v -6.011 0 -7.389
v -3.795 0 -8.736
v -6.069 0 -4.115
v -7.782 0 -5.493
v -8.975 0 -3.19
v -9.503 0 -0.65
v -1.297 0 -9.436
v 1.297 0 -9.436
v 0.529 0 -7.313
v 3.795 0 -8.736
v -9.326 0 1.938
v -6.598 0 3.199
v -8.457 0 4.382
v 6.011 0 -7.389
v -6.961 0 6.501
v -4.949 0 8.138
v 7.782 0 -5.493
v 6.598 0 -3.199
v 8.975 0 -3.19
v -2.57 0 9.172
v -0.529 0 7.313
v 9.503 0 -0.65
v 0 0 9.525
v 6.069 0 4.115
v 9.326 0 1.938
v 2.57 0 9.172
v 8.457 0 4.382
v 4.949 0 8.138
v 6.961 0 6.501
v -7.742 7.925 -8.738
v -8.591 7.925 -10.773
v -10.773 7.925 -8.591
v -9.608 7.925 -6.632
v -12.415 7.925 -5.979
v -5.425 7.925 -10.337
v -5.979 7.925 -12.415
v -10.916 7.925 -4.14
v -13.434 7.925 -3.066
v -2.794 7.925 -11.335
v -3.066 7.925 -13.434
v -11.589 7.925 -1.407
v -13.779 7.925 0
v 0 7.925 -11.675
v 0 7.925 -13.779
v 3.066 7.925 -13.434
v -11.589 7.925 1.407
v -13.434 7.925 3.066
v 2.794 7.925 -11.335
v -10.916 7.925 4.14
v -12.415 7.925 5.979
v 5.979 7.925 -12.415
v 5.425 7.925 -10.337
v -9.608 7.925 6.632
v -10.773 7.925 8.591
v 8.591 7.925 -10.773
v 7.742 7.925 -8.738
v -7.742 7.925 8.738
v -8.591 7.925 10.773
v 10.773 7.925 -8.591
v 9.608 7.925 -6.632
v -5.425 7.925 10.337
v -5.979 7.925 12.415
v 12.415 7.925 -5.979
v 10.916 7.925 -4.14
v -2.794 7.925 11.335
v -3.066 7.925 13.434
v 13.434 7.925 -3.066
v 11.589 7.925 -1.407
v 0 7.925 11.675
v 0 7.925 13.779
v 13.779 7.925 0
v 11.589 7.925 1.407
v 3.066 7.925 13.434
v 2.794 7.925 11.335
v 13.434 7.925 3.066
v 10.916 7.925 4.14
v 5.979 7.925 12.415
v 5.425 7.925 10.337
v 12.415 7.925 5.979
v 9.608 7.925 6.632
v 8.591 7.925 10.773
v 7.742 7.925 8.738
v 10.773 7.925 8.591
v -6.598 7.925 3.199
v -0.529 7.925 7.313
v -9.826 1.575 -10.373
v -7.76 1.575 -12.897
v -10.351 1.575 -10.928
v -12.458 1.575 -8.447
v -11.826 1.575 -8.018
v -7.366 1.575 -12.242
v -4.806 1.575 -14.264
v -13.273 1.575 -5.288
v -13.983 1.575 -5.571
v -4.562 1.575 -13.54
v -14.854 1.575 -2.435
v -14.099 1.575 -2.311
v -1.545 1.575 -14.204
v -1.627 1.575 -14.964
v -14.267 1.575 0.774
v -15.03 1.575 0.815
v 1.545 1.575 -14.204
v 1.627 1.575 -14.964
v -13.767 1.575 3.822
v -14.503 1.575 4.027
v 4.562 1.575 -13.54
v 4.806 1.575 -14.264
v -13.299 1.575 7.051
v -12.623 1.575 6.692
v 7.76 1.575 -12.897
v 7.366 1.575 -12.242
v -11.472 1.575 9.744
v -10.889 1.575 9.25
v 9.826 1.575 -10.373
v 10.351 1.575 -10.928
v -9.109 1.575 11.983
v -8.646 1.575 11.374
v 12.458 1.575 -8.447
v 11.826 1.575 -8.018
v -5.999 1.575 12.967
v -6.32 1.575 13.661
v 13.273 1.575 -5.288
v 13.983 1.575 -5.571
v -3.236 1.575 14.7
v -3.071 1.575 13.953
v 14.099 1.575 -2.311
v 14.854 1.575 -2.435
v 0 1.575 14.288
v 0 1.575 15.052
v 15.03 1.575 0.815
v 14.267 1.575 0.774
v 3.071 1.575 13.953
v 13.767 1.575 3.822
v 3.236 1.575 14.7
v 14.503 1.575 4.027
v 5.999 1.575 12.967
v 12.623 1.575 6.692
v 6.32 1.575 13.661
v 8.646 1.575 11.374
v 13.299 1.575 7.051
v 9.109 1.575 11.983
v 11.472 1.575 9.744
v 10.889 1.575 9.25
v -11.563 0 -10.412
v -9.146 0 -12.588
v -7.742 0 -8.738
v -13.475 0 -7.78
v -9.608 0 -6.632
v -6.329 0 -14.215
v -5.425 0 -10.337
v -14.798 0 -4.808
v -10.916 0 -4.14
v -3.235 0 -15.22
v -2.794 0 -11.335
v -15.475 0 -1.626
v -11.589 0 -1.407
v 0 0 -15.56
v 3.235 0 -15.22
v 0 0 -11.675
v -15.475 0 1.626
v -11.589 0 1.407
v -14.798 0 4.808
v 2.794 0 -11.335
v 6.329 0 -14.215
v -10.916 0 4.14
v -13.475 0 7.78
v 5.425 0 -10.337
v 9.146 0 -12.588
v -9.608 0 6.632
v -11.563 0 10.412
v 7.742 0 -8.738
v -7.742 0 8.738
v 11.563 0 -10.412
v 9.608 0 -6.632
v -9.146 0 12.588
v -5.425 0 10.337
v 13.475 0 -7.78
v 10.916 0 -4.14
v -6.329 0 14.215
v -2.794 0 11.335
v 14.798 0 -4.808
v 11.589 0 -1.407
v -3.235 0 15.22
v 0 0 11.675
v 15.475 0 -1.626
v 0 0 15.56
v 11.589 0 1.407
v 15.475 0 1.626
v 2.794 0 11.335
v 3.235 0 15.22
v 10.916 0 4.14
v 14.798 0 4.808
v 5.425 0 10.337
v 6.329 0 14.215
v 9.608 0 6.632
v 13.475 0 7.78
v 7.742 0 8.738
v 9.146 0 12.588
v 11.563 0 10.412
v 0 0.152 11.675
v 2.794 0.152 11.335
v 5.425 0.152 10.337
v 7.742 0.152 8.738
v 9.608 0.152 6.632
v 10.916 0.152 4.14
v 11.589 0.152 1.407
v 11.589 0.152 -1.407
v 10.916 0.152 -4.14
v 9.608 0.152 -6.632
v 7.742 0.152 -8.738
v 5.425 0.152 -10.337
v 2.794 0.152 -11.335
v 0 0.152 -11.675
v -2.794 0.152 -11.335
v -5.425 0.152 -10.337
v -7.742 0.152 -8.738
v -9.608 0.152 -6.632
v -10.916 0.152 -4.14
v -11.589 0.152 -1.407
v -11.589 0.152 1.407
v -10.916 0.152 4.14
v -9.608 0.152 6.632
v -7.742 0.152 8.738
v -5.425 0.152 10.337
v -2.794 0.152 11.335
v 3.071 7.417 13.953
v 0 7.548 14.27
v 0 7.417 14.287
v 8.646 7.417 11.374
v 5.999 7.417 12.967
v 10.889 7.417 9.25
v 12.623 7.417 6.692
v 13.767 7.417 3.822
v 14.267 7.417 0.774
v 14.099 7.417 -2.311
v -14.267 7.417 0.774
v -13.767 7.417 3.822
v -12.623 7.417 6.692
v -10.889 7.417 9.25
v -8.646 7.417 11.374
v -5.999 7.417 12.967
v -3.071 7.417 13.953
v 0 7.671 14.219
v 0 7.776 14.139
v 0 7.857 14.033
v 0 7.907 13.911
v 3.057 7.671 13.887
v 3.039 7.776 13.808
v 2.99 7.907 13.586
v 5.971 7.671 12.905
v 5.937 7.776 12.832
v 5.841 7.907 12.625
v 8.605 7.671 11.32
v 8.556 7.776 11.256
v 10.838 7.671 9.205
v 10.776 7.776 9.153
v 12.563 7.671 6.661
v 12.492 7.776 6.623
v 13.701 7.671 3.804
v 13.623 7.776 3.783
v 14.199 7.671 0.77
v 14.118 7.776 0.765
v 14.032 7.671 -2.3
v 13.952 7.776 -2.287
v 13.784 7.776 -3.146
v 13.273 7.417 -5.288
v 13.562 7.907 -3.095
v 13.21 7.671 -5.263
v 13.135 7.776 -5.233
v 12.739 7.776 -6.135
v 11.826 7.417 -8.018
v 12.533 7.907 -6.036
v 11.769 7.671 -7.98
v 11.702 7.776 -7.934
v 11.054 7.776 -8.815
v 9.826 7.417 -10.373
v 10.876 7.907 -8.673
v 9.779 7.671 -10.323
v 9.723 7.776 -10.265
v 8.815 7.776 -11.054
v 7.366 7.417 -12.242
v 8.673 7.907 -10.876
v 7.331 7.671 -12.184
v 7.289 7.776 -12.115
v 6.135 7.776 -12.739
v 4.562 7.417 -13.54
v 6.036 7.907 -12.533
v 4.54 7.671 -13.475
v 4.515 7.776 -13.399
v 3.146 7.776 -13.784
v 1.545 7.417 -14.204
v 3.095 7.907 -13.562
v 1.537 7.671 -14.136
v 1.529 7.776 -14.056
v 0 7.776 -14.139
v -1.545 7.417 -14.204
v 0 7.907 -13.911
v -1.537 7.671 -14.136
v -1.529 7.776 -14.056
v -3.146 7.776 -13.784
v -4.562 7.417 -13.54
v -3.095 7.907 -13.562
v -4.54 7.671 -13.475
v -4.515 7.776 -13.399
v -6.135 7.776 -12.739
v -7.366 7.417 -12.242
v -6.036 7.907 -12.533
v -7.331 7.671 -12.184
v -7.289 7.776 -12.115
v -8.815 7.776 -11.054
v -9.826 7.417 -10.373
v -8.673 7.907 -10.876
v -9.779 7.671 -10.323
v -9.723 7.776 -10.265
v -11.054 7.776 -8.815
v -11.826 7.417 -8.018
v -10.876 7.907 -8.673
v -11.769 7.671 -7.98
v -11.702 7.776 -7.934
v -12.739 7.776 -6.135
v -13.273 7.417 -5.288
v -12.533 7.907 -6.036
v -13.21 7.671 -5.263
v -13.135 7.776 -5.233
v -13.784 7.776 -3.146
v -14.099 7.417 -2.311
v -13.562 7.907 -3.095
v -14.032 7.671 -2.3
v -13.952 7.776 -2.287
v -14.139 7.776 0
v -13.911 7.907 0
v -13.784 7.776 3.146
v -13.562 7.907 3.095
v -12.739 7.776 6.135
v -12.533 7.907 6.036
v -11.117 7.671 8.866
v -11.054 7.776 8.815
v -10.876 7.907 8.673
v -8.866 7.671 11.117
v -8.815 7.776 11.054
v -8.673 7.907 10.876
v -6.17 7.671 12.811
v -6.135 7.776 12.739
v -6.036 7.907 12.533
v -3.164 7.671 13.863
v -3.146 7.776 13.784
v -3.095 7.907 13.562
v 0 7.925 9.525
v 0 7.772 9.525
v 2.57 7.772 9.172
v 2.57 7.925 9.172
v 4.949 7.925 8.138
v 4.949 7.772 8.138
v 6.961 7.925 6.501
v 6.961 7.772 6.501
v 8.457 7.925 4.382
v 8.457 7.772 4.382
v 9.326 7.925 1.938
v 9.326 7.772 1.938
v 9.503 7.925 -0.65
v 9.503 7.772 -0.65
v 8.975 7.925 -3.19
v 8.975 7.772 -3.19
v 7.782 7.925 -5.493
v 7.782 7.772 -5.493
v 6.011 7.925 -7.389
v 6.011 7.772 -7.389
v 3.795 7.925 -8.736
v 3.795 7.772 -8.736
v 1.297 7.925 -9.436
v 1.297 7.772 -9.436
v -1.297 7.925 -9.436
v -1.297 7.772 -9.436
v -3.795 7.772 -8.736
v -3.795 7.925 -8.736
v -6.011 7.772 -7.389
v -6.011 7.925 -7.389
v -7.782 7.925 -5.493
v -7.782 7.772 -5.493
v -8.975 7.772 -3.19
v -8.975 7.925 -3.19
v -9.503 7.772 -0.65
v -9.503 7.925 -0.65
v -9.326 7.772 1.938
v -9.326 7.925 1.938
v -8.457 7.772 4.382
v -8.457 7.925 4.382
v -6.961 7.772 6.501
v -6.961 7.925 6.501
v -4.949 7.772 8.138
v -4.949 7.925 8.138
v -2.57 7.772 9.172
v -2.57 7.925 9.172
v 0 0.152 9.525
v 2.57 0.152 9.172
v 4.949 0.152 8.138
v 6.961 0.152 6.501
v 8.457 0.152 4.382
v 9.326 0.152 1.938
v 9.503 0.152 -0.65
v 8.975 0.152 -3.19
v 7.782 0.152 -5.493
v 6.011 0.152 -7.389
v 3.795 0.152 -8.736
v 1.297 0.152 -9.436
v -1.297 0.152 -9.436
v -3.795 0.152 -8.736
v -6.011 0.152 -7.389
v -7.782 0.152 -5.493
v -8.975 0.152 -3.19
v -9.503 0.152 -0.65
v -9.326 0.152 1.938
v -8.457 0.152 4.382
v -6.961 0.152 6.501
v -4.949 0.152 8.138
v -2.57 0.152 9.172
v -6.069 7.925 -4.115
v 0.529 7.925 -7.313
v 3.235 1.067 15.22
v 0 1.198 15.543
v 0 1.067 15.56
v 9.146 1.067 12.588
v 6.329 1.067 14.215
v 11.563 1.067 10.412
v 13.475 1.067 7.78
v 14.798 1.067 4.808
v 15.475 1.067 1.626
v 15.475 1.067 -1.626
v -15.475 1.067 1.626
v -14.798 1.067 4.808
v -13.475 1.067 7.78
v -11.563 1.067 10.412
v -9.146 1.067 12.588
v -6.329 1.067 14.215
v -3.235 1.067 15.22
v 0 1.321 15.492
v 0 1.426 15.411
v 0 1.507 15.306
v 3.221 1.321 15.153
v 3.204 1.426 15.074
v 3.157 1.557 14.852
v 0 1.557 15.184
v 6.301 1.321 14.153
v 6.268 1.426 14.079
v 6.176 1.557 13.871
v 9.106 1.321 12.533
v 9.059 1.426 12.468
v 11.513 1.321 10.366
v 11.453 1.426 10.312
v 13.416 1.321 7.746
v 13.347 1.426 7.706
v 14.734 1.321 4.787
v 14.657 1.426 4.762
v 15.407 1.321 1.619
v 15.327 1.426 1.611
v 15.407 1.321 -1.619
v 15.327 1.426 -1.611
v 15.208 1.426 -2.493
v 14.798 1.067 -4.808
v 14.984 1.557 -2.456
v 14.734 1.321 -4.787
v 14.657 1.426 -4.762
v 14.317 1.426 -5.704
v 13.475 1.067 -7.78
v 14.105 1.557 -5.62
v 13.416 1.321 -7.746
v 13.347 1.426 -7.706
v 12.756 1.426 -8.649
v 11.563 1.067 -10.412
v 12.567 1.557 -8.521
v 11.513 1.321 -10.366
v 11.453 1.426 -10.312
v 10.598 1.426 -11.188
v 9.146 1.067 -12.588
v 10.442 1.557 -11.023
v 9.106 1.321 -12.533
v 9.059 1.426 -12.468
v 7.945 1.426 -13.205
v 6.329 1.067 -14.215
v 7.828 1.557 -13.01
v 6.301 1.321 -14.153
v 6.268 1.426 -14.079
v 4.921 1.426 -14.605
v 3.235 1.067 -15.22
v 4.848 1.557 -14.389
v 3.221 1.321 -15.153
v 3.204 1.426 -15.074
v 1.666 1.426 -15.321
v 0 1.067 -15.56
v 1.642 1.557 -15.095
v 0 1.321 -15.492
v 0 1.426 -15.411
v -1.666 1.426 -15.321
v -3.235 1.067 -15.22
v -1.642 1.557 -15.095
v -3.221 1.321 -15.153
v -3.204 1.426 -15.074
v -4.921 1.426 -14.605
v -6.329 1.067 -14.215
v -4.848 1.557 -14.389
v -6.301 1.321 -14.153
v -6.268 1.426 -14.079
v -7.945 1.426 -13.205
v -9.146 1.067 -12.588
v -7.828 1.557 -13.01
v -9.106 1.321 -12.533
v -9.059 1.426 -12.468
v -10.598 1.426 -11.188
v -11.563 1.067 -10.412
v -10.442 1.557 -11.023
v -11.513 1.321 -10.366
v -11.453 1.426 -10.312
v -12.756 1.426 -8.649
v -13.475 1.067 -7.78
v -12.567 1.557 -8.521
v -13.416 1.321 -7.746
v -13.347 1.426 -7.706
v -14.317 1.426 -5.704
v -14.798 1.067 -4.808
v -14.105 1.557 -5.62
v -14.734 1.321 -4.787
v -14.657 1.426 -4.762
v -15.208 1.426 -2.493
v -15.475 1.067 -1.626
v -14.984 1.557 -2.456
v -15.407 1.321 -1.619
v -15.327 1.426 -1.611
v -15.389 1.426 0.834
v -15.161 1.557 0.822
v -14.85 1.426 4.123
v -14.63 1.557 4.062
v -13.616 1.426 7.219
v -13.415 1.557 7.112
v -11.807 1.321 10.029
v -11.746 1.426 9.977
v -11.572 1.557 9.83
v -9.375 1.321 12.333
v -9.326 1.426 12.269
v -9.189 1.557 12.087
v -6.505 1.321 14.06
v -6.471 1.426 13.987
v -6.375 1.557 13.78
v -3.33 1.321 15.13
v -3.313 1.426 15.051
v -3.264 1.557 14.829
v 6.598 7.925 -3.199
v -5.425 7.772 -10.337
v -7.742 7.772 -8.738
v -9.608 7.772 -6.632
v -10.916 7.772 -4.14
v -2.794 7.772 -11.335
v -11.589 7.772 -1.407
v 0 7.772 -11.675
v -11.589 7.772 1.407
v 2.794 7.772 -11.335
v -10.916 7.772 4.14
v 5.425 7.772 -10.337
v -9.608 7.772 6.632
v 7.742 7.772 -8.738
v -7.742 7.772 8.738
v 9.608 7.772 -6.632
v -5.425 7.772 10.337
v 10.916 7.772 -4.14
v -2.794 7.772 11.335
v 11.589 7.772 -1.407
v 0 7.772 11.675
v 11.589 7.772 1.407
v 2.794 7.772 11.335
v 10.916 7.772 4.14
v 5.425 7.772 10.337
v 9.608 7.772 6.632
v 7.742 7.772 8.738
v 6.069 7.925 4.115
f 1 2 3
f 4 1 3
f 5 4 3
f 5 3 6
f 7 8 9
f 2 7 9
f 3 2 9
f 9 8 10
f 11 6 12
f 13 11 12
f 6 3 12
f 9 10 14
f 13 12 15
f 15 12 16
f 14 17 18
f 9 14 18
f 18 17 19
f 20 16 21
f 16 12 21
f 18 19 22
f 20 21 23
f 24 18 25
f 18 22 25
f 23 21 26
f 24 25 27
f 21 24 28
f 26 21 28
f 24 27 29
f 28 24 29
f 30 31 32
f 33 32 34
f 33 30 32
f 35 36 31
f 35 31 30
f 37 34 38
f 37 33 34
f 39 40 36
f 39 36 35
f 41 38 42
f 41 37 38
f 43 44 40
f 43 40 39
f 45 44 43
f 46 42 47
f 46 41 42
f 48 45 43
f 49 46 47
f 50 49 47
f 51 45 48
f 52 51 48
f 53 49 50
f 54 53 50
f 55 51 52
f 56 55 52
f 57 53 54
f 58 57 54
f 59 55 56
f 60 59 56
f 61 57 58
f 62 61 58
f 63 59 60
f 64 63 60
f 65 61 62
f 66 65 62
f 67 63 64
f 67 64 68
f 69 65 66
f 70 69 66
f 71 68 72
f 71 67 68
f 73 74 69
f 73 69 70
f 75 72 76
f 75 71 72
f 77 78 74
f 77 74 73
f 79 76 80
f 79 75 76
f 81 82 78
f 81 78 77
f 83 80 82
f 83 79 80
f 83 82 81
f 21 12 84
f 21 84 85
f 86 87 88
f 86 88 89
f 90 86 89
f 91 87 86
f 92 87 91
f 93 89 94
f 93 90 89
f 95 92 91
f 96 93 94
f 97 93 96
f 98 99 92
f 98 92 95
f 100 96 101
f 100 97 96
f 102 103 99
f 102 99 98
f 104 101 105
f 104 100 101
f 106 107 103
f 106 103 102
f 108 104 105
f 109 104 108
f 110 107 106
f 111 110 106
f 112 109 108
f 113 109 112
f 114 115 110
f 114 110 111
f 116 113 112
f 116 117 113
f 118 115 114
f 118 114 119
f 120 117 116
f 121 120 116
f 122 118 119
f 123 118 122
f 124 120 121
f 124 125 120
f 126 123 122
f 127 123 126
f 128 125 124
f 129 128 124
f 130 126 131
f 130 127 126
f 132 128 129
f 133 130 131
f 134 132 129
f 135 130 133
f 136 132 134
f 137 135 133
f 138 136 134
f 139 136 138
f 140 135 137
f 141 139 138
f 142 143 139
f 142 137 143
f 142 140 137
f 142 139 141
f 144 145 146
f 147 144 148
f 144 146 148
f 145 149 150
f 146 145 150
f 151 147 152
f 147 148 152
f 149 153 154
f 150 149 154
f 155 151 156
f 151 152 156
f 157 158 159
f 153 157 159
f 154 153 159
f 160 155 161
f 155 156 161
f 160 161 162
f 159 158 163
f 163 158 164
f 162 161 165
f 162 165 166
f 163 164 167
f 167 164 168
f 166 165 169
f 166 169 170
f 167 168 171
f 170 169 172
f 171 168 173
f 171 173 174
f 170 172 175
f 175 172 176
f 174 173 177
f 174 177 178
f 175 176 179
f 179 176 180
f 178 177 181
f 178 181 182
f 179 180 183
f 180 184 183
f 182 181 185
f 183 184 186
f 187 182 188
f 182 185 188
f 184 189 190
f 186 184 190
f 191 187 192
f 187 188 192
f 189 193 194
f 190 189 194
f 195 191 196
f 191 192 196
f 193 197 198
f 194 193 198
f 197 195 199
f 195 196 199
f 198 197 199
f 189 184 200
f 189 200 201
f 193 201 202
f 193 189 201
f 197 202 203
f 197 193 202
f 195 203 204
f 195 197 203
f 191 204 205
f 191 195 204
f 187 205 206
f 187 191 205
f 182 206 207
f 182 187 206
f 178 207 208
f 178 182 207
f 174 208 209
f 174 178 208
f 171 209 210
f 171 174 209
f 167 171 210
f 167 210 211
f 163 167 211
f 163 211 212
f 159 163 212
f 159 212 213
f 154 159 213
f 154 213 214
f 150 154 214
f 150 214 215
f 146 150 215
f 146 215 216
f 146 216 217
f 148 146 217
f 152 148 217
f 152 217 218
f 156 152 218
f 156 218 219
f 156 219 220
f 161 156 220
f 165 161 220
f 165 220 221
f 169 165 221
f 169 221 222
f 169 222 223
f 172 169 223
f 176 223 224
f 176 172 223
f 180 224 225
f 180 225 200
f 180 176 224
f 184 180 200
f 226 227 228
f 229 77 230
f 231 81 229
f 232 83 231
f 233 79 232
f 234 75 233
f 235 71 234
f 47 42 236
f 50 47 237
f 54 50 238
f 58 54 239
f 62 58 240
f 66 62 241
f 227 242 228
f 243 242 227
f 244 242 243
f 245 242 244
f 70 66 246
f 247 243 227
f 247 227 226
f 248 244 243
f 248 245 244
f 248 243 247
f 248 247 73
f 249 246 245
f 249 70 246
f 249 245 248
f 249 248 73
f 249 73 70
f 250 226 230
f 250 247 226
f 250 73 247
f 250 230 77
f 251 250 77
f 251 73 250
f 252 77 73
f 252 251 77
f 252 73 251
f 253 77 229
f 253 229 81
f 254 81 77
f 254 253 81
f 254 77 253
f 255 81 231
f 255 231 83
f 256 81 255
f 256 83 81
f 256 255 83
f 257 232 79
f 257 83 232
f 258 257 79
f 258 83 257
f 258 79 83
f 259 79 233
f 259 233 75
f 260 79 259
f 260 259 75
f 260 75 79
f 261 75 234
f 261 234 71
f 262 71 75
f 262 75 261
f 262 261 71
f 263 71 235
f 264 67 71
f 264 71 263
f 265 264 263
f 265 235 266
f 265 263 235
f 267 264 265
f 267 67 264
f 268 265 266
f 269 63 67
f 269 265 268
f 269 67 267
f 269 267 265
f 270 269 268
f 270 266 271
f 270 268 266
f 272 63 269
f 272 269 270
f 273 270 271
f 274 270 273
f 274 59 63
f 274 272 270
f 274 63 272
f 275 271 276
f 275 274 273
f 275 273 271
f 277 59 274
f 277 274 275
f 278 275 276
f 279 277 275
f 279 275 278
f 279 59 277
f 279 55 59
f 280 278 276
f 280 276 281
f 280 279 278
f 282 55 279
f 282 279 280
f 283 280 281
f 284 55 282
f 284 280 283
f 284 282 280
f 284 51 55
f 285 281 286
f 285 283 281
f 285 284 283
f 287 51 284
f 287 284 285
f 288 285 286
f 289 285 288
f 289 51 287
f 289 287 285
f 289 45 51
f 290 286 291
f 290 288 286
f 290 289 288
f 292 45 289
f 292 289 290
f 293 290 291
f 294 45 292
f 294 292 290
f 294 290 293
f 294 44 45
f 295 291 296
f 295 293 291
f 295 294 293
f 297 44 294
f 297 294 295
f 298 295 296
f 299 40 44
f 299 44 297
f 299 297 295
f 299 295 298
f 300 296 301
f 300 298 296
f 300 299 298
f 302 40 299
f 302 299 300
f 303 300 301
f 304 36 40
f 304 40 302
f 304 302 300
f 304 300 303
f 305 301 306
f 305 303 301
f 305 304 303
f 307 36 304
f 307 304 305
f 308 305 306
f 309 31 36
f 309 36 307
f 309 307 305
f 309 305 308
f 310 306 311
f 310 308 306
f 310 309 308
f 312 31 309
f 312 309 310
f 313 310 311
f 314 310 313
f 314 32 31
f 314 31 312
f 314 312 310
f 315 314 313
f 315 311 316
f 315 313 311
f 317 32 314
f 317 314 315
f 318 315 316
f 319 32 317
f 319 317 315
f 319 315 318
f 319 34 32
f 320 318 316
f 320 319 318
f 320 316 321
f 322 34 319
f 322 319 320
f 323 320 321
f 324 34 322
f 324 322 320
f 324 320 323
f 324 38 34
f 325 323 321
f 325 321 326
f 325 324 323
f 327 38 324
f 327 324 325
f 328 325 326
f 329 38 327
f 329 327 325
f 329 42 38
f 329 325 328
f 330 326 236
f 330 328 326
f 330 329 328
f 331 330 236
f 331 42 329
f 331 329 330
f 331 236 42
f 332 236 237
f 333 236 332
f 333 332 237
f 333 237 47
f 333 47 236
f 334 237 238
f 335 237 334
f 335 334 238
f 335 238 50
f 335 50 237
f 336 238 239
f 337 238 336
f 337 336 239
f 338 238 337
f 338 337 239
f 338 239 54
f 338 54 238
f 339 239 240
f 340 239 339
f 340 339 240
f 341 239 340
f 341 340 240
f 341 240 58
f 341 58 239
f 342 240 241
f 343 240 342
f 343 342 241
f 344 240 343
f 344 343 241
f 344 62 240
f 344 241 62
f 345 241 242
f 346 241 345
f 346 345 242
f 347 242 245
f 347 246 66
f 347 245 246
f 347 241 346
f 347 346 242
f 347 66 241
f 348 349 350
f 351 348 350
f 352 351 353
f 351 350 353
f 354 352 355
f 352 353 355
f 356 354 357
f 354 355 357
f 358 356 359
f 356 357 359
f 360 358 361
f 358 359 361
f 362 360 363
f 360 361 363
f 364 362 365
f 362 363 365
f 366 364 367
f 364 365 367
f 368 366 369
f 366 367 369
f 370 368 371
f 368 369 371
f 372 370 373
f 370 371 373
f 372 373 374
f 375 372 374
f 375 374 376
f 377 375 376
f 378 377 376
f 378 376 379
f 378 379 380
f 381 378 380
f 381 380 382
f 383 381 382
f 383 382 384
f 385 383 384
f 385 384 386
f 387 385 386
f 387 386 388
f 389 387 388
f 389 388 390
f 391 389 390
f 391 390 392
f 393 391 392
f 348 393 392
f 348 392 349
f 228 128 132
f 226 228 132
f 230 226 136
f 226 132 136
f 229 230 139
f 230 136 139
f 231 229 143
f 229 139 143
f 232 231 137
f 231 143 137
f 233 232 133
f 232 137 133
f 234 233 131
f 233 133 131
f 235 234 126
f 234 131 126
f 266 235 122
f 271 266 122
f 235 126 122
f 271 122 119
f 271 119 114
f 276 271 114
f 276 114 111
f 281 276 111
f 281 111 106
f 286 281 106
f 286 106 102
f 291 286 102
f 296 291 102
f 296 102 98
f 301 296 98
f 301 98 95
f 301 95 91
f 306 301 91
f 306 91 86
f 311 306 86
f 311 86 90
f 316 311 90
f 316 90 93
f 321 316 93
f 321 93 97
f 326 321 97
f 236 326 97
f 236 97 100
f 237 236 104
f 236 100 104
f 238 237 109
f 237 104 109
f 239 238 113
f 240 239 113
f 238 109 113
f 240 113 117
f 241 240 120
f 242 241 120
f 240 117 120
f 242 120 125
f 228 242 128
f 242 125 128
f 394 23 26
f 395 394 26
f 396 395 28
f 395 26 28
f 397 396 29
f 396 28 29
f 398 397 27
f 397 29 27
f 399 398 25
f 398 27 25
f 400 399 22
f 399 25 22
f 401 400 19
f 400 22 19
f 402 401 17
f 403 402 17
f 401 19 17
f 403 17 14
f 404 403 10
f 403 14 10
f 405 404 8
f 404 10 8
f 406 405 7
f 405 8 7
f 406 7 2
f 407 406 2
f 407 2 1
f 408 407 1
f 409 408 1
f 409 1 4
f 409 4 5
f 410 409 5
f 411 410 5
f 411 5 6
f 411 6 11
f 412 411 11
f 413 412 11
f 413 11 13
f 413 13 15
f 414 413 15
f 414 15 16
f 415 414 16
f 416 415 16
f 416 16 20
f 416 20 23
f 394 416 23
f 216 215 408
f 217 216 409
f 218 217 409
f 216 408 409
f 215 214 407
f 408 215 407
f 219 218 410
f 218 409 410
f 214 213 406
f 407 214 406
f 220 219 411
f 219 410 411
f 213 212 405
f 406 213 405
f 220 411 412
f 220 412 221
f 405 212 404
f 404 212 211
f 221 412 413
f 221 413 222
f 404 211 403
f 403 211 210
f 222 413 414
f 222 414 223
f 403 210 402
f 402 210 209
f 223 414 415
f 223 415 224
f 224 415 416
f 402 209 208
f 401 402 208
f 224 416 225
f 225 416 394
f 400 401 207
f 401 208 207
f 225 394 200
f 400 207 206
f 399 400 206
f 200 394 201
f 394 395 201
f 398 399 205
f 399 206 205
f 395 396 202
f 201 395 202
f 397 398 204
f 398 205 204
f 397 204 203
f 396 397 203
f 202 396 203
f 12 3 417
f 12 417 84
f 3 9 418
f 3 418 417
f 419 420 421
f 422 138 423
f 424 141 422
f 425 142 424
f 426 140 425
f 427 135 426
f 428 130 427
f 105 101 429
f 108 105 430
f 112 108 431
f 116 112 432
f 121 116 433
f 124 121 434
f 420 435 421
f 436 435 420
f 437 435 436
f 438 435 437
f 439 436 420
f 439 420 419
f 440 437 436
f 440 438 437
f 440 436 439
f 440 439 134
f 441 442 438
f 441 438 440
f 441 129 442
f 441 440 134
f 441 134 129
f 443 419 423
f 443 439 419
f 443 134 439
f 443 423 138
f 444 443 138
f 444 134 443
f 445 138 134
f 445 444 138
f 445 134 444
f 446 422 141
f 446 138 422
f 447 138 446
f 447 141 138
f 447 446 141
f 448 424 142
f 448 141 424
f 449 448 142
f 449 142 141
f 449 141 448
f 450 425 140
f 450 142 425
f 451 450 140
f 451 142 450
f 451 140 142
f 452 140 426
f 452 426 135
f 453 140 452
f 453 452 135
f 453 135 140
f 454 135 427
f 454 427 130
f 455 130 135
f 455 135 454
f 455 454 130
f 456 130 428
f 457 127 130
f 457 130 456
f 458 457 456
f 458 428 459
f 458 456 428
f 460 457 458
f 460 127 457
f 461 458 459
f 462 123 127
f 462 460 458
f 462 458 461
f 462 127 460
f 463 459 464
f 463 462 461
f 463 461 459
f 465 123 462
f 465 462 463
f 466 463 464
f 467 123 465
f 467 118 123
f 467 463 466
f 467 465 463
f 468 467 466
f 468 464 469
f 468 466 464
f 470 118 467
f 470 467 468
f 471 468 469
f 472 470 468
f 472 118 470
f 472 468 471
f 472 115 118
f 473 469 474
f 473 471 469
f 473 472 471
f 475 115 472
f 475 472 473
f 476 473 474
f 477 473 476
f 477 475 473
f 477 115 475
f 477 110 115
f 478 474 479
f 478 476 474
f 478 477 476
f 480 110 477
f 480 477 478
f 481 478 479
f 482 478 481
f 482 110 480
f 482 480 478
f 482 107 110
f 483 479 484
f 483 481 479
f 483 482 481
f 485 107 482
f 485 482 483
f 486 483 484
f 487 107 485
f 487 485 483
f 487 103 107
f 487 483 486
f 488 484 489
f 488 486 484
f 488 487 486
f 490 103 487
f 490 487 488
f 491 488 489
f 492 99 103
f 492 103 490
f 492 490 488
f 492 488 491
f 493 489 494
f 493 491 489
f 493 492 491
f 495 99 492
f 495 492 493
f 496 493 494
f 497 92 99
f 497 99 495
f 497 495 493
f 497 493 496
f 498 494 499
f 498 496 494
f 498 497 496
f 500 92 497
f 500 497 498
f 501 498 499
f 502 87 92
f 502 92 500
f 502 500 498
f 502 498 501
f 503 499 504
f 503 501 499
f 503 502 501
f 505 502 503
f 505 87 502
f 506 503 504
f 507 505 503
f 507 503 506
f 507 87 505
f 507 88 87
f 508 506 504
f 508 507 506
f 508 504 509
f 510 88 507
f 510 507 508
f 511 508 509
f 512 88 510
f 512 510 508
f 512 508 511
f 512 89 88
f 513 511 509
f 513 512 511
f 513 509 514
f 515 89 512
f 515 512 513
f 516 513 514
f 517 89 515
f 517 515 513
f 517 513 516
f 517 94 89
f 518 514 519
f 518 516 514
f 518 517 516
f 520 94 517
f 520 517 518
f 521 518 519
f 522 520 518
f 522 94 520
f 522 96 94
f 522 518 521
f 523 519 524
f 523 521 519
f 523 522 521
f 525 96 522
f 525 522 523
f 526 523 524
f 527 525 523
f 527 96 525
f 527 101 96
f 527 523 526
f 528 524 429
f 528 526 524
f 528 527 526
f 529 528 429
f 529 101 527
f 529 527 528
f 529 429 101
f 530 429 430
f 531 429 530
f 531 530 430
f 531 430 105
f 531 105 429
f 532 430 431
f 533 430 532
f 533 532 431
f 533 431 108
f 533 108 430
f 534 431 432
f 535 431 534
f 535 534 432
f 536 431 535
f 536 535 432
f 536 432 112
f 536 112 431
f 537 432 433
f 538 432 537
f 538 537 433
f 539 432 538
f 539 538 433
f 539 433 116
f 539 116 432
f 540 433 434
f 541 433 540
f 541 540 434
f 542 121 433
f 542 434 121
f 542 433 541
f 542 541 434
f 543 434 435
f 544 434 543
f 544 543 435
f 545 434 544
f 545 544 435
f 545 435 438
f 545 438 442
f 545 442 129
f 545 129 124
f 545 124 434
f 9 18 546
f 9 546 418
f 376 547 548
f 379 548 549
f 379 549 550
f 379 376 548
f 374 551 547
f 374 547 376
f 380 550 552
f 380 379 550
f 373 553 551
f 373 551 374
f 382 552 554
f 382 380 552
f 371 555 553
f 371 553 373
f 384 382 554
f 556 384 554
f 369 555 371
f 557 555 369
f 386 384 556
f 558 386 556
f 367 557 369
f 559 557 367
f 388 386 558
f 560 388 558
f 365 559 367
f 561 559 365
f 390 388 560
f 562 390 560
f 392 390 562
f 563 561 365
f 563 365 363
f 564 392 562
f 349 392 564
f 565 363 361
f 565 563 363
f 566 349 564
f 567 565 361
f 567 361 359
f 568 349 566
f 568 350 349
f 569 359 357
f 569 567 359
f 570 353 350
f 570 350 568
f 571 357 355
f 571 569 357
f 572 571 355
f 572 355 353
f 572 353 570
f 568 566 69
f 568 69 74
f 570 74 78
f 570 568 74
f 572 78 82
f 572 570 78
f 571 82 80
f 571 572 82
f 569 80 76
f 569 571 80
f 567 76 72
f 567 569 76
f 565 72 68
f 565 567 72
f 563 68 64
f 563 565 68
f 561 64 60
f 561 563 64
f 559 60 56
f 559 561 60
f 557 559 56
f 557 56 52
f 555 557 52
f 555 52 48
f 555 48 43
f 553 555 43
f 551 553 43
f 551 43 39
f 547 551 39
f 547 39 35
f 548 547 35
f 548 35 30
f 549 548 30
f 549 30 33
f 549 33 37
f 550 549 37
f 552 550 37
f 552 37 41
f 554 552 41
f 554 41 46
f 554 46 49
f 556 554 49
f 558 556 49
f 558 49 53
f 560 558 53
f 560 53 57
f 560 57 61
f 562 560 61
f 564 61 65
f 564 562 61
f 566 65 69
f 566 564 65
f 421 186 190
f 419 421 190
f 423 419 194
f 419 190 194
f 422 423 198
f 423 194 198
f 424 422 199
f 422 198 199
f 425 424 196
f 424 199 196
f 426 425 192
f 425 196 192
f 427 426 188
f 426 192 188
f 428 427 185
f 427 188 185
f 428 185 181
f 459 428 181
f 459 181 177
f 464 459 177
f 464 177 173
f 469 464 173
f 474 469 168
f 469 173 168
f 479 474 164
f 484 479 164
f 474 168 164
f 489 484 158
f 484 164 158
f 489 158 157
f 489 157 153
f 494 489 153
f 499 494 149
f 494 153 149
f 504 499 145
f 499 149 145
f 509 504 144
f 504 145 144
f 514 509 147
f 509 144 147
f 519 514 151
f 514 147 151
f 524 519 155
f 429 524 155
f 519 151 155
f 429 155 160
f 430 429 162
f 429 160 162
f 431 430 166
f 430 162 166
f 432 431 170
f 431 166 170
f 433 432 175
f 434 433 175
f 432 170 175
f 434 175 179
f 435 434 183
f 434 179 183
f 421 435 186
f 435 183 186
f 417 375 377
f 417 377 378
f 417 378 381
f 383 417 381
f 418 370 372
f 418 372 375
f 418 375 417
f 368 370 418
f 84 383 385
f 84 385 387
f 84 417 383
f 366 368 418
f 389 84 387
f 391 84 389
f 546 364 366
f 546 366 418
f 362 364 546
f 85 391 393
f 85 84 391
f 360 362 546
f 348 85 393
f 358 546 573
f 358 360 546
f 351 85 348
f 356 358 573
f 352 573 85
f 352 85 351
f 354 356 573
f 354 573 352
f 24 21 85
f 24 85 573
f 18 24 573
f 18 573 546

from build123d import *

# Parameters (mm, degrees)
SKETCH1_R                = 9.525
BOSS_EXTRUDE1_DEPTH      = 7.9248
BOSS_EXTRUDE2_DEPTH      = 3.81
BOSS_EXTRUDE2_DEPTH_BACK = 3.81
SKETCH2_R                = 11.67450685
SKETCH2_R_2              = 9.525
SKETCH3_R                = 14.2875
SKETCH3_R_2              = 11.67450685
BOSS_EXTRUDE4_DEPTH      = 7.9248
SKETCH4_R                = 15.56004
SKETCH4_R_2              = 14.2875
BOSS_EXTRUDE5_DEPTH      = 1.5748
FILLET1_R                = 0.508


with BuildPart() as part:
    # Sketch1 → Boss-Extrude1 (new body)
    with BuildSketch(Plane(origin=(0, 0, 0), x_dir=(1, 0, 0), z_dir=(0, 1, 0))):
        Circle(SKETCH1_R)
        Polygon((6.069005203, -4.114669997), (6.597911347, 3.198577683), (0.528906144, 7.31324768), (-6.069005203, 4.114669997), (-6.597911347, -3.198577683), (-0.528906144, -7.31324768), align=None, mode=Mode.SUBTRACT)
    extrude(amount=BOSS_EXTRUDE1_DEPTH)



with BuildPart() as body_2:
    # Sketch2 → Boss-Extrude2 (new, two sides: drawn at the far end of the back side and taken through both)
    with BuildSketch(Plane(origin=(0, 3.9624, 0), x_dir=(1, 0, 0), z_dir=(0, 1, 0)).offset(-BOSS_EXTRUDE2_DEPTH_BACK)):
        Circle(SKETCH2_R)
        Circle(SKETCH2_R_2, mode=Mode.SUBTRACT)
    extrude(amount=BOSS_EXTRUDE2_DEPTH + BOSS_EXTRUDE2_DEPTH_BACK)


with BuildPart() as part_1:
    add(part.part)

    add(body_2.part)  # Boss-Extrude4 merges body 2
    # Sketch3 → Boss-Extrude4 (add)
    with BuildSketch(Plane(origin=(0, 0, 0), x_dir=(1, 0, 0), z_dir=(0, 1, 0))):
        Circle(SKETCH3_R)
        Circle(SKETCH3_R_2, mode=Mode.SUBTRACT)
    extrude(amount=BOSS_EXTRUDE4_DEPTH)

    # Sketch4 → Boss-Extrude5 (add)
    with BuildSketch(Plane(origin=(0, 0, 0), x_dir=(1, 0, 0), z_dir=(0, 1, 0))):
        Circle(SKETCH4_R)
        Circle(SKETCH4_R_2, mode=Mode.SUBTRACT)
    extrude(amount=BOSS_EXTRUDE5_DEPTH)

    # Fillet1
    fillet1_edges = [part_1.edges().sort_by_distance(p)[0] for p in [
        (-15.56004, 1.5748, 0),
        (-14.2875, 7.9248, 0),
    ]]
    fillet(fillet1_edges, radius=FILLET1_R)


solid = part_1.part
